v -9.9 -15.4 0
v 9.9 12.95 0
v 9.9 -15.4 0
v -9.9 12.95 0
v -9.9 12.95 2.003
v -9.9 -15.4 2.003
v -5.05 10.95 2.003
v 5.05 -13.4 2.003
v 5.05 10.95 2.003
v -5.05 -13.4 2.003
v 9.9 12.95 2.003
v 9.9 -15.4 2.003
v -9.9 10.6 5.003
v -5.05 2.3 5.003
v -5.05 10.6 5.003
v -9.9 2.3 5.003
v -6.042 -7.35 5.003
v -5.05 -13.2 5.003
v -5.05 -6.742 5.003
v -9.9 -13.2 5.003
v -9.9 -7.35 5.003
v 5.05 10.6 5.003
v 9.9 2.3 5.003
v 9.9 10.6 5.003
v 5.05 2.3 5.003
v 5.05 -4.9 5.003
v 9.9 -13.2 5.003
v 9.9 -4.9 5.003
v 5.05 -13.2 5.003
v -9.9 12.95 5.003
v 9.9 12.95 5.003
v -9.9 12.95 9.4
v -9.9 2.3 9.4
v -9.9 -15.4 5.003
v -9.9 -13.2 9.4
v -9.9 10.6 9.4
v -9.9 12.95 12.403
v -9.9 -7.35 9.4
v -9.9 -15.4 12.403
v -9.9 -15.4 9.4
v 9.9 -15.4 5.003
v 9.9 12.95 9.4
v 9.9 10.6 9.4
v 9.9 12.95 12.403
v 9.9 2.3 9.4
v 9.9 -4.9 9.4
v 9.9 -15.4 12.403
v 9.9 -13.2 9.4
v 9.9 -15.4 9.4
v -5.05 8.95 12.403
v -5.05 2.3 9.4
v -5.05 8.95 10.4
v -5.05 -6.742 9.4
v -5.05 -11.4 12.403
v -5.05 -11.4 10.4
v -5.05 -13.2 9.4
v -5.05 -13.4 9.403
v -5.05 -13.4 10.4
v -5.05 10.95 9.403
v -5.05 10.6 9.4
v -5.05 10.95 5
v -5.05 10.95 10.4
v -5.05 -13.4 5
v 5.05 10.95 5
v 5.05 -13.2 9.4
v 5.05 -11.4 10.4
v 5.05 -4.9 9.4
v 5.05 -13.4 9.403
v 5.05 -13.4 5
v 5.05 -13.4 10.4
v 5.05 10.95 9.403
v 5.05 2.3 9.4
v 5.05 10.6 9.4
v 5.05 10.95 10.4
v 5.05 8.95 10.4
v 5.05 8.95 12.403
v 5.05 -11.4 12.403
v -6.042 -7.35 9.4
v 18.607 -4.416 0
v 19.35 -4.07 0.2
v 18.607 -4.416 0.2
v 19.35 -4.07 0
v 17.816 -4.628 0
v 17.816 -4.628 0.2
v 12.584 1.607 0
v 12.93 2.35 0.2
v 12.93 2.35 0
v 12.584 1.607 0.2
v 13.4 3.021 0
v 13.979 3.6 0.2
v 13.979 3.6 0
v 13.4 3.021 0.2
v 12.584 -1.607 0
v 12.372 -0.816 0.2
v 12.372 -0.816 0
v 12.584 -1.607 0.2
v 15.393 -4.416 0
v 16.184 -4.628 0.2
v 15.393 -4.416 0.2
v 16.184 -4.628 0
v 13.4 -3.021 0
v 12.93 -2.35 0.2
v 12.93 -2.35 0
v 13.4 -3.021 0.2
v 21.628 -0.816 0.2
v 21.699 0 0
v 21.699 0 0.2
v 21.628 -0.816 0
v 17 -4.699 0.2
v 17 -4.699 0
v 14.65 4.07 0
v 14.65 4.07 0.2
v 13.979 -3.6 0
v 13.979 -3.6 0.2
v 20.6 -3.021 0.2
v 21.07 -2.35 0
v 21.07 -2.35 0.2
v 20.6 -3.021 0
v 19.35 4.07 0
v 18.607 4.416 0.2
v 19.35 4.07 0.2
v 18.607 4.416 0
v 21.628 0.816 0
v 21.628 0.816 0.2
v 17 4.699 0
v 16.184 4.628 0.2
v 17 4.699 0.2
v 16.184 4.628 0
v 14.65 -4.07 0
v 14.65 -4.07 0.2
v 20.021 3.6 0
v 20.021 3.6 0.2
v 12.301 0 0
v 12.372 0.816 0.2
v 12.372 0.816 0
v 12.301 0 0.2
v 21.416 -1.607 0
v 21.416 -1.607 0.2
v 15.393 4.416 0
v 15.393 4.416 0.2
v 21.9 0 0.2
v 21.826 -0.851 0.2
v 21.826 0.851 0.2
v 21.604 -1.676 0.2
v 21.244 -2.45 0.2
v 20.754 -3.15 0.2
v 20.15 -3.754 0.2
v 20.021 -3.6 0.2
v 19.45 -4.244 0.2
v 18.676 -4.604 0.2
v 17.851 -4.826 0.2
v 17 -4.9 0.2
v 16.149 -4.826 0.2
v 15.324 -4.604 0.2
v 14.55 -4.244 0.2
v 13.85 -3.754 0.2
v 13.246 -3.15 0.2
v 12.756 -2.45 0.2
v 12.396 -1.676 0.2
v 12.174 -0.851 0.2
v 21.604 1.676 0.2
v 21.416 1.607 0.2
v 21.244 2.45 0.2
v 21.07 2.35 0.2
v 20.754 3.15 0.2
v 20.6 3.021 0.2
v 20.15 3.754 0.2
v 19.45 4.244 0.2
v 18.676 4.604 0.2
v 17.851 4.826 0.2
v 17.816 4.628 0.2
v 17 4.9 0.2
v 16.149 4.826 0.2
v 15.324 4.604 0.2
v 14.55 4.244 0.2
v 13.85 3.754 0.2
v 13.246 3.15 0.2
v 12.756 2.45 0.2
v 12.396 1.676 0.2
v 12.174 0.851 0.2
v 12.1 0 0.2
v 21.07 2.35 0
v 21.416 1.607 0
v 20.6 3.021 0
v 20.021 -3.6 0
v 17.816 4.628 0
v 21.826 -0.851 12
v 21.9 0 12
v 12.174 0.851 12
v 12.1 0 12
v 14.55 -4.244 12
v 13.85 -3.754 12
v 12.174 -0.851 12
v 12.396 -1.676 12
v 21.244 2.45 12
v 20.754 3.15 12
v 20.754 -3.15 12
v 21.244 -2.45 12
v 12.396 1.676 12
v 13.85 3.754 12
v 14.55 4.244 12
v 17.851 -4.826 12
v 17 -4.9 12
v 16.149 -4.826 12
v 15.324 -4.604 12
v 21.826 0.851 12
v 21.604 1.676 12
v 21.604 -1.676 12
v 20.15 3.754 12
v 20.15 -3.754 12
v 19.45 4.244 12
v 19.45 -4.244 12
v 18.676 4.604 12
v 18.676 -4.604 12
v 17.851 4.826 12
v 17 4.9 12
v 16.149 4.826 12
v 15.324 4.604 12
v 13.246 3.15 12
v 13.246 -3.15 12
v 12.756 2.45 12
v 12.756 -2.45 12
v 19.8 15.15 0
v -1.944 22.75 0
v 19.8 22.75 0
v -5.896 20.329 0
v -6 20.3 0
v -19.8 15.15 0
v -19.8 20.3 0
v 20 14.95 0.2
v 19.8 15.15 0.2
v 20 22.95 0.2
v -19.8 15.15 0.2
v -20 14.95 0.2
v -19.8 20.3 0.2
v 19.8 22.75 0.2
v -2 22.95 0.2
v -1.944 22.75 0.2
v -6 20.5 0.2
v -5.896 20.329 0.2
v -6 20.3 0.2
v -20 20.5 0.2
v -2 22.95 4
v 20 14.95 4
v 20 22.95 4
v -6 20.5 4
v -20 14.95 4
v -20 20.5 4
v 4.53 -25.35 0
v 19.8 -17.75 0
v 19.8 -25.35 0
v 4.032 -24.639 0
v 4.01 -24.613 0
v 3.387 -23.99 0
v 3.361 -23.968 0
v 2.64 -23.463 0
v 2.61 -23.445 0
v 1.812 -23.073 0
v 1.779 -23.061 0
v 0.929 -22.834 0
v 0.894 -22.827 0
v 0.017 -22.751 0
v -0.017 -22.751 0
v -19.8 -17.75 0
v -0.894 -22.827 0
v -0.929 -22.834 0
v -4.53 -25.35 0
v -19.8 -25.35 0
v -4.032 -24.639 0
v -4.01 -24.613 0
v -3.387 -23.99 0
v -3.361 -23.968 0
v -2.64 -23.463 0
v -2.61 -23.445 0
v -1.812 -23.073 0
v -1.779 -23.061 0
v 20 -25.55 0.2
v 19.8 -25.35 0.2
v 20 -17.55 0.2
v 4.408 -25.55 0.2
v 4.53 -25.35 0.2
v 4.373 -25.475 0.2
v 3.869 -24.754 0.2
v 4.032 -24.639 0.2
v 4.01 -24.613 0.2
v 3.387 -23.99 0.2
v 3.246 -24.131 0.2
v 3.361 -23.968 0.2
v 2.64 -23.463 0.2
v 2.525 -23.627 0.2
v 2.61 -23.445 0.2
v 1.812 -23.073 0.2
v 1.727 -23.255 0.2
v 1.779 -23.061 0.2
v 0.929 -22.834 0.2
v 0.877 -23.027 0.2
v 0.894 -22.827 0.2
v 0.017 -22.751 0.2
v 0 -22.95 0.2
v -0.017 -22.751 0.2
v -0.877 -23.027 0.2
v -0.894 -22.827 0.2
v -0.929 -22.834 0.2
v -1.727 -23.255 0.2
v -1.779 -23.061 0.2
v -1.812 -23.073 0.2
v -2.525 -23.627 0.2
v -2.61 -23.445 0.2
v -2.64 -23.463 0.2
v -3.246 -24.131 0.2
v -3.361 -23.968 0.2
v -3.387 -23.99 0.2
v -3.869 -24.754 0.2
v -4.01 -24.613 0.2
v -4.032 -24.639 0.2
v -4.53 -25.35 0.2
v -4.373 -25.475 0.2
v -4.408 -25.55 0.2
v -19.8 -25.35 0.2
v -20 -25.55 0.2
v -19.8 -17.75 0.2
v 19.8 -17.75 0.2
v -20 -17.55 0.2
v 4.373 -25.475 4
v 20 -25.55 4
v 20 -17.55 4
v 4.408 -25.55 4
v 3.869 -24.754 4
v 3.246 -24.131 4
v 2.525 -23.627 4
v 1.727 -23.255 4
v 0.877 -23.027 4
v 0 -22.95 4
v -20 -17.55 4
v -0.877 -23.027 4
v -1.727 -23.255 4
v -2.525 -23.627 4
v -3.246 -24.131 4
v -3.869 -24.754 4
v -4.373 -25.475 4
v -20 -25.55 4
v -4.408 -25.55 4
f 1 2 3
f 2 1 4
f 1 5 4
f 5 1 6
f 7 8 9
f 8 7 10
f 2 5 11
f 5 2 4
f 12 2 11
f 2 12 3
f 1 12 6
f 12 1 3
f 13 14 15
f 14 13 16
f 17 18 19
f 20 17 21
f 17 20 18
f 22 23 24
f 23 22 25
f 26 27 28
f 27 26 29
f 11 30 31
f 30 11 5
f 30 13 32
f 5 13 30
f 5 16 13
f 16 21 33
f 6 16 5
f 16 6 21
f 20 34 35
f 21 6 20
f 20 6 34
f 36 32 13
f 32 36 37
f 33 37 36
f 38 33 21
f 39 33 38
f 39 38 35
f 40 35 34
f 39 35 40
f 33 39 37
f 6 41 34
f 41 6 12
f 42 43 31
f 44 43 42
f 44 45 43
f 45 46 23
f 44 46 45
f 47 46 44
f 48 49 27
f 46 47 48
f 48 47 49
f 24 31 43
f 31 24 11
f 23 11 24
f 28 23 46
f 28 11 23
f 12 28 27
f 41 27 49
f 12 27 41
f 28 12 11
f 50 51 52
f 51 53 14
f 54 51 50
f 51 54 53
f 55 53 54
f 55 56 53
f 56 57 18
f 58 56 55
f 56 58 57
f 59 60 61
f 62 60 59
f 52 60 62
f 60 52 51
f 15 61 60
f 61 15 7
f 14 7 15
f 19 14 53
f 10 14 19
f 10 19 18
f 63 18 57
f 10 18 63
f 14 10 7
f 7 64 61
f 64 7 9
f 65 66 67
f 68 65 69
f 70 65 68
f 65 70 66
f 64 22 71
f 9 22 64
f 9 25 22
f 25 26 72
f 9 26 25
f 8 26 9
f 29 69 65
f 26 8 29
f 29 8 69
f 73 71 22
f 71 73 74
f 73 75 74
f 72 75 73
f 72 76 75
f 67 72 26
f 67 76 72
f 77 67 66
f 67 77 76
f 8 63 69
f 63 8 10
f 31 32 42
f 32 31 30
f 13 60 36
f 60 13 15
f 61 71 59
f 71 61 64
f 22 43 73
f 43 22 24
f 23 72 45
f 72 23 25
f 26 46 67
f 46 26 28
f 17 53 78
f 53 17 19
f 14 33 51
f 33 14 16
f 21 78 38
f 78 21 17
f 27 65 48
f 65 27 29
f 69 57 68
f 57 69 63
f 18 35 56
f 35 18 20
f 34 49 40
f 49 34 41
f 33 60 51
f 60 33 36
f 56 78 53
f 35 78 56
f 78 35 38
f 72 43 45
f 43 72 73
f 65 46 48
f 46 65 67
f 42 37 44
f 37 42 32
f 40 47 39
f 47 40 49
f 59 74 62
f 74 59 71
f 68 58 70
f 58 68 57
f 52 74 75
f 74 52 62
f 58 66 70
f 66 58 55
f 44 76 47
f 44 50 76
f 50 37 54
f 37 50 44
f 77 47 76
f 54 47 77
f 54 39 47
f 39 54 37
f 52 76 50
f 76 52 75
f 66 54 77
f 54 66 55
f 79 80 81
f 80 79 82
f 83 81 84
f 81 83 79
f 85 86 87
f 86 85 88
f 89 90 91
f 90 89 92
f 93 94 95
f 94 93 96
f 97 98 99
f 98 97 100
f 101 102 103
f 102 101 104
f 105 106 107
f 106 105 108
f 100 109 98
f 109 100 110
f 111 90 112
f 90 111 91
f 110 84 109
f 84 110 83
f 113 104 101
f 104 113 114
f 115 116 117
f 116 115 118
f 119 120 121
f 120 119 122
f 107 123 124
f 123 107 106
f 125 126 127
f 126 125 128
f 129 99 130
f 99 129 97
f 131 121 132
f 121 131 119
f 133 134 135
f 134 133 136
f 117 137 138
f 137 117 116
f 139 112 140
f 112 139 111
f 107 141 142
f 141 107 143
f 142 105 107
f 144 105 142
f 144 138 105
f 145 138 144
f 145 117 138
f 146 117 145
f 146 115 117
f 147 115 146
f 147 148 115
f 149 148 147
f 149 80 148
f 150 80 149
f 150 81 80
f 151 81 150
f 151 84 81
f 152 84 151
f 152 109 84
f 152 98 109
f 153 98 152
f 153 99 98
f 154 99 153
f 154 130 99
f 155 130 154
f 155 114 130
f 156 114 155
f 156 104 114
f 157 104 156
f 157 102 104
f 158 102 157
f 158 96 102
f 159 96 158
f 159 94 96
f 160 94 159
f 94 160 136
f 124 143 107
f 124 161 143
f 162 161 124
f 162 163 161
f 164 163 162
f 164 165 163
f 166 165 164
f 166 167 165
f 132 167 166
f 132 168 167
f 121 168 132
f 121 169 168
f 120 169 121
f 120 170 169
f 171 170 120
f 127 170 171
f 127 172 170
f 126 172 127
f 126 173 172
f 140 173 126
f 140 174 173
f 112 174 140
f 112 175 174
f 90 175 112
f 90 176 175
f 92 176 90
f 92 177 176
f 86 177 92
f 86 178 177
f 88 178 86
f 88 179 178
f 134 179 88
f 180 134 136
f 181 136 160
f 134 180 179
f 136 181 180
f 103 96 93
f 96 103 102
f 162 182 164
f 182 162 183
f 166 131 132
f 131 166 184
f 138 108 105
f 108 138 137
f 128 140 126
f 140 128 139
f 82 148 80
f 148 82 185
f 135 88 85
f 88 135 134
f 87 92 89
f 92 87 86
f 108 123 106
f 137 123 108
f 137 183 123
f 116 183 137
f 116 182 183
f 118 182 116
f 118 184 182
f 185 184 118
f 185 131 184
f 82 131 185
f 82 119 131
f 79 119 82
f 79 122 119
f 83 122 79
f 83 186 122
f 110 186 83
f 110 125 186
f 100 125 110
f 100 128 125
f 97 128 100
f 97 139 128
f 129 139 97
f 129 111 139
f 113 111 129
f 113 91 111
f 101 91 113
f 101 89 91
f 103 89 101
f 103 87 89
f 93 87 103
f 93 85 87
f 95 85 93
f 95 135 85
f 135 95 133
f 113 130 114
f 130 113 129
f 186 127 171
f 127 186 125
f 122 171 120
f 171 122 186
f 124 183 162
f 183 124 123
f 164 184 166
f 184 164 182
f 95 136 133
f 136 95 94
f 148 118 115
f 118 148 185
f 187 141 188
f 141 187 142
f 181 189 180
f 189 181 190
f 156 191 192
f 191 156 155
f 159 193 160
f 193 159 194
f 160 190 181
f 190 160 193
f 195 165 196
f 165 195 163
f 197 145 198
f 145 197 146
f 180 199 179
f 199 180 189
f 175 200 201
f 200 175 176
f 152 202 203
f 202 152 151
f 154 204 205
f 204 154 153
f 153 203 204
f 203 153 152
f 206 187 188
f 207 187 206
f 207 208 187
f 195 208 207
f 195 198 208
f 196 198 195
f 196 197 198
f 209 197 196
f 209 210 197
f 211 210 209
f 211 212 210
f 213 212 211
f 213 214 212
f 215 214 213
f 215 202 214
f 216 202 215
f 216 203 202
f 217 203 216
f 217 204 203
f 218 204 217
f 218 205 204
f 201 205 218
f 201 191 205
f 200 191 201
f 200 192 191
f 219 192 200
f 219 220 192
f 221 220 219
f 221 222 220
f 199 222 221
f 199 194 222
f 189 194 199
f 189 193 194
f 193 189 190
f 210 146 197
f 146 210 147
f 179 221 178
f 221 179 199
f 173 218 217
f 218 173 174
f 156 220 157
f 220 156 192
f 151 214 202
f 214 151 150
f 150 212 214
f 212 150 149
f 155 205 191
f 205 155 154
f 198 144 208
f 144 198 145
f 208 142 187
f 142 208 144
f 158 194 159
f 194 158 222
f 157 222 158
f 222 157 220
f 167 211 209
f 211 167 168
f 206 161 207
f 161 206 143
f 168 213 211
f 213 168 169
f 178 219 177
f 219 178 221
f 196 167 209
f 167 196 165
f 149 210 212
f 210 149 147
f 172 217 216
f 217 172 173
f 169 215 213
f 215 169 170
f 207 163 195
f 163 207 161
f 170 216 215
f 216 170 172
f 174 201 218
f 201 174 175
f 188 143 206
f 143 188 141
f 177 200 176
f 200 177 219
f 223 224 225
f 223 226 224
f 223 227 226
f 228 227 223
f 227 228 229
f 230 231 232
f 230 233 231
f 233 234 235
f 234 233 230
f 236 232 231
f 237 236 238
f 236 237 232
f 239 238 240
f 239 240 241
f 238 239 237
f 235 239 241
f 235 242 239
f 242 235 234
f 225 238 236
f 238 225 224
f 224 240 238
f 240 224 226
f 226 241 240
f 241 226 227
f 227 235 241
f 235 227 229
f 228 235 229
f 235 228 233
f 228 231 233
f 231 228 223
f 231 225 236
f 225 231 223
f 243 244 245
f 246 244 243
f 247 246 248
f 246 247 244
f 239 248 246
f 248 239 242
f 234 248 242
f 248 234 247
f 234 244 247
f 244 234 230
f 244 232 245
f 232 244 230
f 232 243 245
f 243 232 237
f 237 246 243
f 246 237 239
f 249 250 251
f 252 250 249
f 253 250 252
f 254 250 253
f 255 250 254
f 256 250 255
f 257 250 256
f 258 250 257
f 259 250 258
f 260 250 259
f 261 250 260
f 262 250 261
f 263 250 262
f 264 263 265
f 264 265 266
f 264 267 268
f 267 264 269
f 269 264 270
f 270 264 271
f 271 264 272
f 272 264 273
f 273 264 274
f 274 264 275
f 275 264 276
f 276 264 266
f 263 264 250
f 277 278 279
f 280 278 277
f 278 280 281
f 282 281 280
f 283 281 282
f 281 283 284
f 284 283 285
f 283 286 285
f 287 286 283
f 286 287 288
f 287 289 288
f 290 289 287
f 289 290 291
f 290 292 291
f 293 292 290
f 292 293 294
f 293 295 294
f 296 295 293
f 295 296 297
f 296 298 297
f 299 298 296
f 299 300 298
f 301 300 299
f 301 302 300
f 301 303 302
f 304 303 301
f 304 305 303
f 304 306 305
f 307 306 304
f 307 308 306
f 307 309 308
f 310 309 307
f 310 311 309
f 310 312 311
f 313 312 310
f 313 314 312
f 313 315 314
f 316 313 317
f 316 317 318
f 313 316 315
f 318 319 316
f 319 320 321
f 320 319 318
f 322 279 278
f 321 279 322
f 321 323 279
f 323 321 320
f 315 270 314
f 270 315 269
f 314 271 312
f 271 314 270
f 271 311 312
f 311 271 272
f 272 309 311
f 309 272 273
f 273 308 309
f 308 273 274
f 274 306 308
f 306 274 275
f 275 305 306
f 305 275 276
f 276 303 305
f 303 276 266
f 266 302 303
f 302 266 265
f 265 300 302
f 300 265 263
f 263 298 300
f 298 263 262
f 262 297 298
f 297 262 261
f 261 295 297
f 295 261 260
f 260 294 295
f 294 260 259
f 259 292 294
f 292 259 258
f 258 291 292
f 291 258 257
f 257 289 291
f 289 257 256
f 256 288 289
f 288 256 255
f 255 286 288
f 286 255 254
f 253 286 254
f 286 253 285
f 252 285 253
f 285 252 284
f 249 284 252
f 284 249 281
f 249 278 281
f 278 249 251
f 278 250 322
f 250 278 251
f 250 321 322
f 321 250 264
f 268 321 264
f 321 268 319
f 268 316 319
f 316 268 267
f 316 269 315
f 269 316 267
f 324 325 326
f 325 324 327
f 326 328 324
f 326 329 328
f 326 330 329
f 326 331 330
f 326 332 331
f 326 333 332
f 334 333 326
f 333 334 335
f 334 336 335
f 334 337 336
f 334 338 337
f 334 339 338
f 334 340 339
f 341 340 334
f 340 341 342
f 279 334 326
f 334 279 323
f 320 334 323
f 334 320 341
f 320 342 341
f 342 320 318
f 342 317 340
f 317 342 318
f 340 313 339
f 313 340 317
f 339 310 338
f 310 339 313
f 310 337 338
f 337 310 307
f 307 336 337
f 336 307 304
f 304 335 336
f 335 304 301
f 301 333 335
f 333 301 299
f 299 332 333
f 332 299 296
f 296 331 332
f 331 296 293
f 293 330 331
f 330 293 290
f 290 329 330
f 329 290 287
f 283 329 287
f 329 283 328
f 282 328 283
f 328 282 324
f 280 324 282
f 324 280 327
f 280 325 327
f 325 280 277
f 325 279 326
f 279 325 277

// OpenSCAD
// file: common.scad
$fa = 10;
$fs = 0.2;
eps = 0.003;
$zstep = 0.2;

// An inward chamfer sufficient to prevent elephant's foot.
foot = 0.4;

// FINDINGS FROM CLEARANCE TEST
//
// Consider a vertical hole of width X, a layer height of 0.2, and a vertical
// post.
//   * A post of diameter X will not fit in.
//   * A post of diameter X-0.1 will fit in, but is very hard to slide in or out.
//     This is probably due mostly to the transverse grain of the print.
//     It will rotate, but with some resistance.
//   * A post of diameter X-0.2 slides in and out easily. It rotates easily, but
//     still has noticeable resistance at some points.
//   * A post of diameter X-0.3 rotates freely. It also has noticeable play
//     from side to side.
//
// Clearances are expressed as the total across both sides of a joint.
tight = 0.1;  // Intended for stationary joints.
snug = 0.2;   // Moves, but with some resistance.
loose = 0.3;  // Free movement.
extra_loose = 0.4;

// A brim is a 0.2mm layer printed near an edge which is likely to warp.
// The edge should be chamfered outwards at 45 degrees. The brim should
// be placed this far from the bottom of the edge, so it barely touches
// the chamfer.
brim_offset = 0.3;

// Menards 5/8 x 2-3/4 x 0.04 WG compression spring.
spring_od = 5/8 * 25.4;
// Subtract 10 from the relaxed length so everything is slightly tensioned
// all the time.
spring_max_length = 2.75 * 25.4 - 10;
spring_min_length = 16;  // Approximate.

// Menards 1/4 inch aluminum rod.
roller_diameter = 6.7;
roller_cavity_diameter = roller_diameter + loose;

// 550 paracord. Make this wide enough to accommodate a melted end.
string_diameter = 4.5;

// Standard spring tube.
tube_id = spring_od + 0.7;

module octagon(diameter) {
  intersection_for(a = [0, 45])
    rotate([0, 0, a])
      square(diameter, center=true);
}

// A cylinder with chamfered or flared ends, useful for dealing with
// elephant's foot on pins or holes.
module flare_cylinder(height, radius, flare_top, flare_bottom) {
  translate([0, 0, abs(flare_bottom)-eps])
    cylinder(height-abs(flare_bottom)-abs(flare_top)+eps, radius, radius);

  // Bottom flare.
  linear_extrude(abs(flare_bottom), scale=radius/(radius-flare_bottom))
    circle(radius-flare_bottom);
  
  // Top flare.
  translate([0, 0, height-abs(flare_top)])
    linear_extrude(abs(flare_top), scale=(radius-flare_top)/radius)
      circle(radius);
}

// A cube with a chamfered or flared bottom end, useful for dealing
// with elephant's foot on pins or holes.
module flare_cube(dims, flare) {
  translate([0, 0, abs(flare)-eps])
    cube([dims.x, dims.y, dims.z - abs(flare) + eps]);

  translate([dims.x/2, dims.y/2, 0])
    linear_extrude(abs(flare), scale=[dims.x/(dims.x-2*flare), dims.y/(dims.y-2*flare)])
      translate([-(dims.x-2*flare)/2, -(dims.y-2*flare)/2, abs(flare)-eps])
        square([dims.x-2*flare, dims.y-2*flare]);
}

// An approximate circle which can be printed on its side.
module circle_ish(r) {
  // Safe overhang angle.
  q = 45;
  
  intersection() {
    // Add 0.2 (one print layer) in case the bridge is messy and hangs
    // down.
    square(2*r+0.2, center=true);
    hull() {
      circle(r);
      for (a = [-1, 1])
        translate([0, a*r/cos(q), 0])
          square(eps, center=true);
    }
  }
}

// Depth of the sockets used as glue aids.
socket_depth = 5;

module socket() {
  translate([-1.5, -1.5, -eps])
    flare_cube([3, 3, socket_depth], -foot);
}

module lug() {
  flare_cube([3-snug, 3-snug, 2*socket_depth-2], foot);
}

// Nerf darts are 0.50 cal.
dart_diameter = 12.7;
dart_length = 72;

module octahedron(major_radius=1) {
  // Top and bottom halves.
  for (a = [-1, 1])
    scale([1, 1, a])
      // Extrude a square into a pyramid.
      linear_extrude(major_radius, scale=0)
        rotate([0, 0, 45])
          square(sqrt(2)*major_radius, center=true);
}

module chamfered_cube(dims, chamfer=1) {
  assert(dims.x >= 2*chamfer);
  assert(dims.y >= 2*chamfer);
  assert(dims.z >= 2*chamfer);

  hull()
    for (a = [0, 1], b = [0, 1], c = [0, 1])
        translate([
          (dims.x - 2*chamfer) * a + chamfer,
          (dims.y - 2*chamfer) * b + chamfer,
          (dims.z - 2*chamfer) * c + chamfer
        ])
          octahedron(chamfer);
}
// main file
include <common.scad>

// 3/8" aluminum rod.
rod = 9.8;

length = 40;
block_height = 8;

module rod_2d() {
  circle(d=rod);
}

module rail_2d() {
  difference() {
    translate([-length/2, rod/4])
      square([length, block_height]);
    circle(d=rod + loose);
  }
}

shelf_x = 2;
ramp_x = 4;
ramp_y = rod / 4;

module ramp_2d() {
  translate([0, -rod/2 - block_height - loose/2]) {
    translate([-shelf_x, 0])
      square([length / 2 + shelf_x, block_height]);
    hull() {
      translate([-shelf_x, 0])
        square([eps, block_height]);
      translate([-shelf_x - ramp_x, 0])
        square([eps, block_height - ramp_y]);
    }
    translate([-length/2, 0])
      square([length/2 - shelf_x - ramp_x, block_height - ramp_y]);
  }
}

module track_2d(hole=true, wall=4) {
  rail_width = 5;
  
  translate([0, -rod/8]) {
    difference() {
      square([rod + 2*rail_width, block_height*2 + rod - ramp_y + rail_width], center=true);
    
      if (hole)
        square([rod + loose, block_height*2 + rod - ramp_y + rail_width - wall], center=true);
    }
  }
}

function sum(list, start, limit) =
  start == limit
  ? 0
  : list[start] + sum(list, start + 1, limit);

module stack(z) {
  for (i = [0 : $children-1])
    translate([0, 0, sum(z, 0, i)])
      linear_extrude(z[i] + eps)
        children(i);
}

sliding_height = 4;

module housing() {
  stack([2, 3, sliding_height + 0.4, 1, 2]) {
    track_2d(false);
    
    track_2d(true);
    
    difference() {
      track_2d(true);
      offset(loose/2) {
        rail_2d();
        ramp_2d();
      }
    }
    
    track_2d(true);
    track_2d(true, 8);
  }
}

module extrude_foot(height) {
  linear_extrude(0.2)
    offset(-0.2)
      children();
  translate([0, 0, 0.2])
    linear_extrude(height - 0.2)
      children();
}

housing();

translate([17, 0])
  extrude_foot(8 + sliding_height)
    rod_2d();

translate([0, 28])
  extrude_foot(sliding_height)
    ramp_2d();

translate([0, -28])
  extrude_foot(sliding_height)
    rail_2d();
